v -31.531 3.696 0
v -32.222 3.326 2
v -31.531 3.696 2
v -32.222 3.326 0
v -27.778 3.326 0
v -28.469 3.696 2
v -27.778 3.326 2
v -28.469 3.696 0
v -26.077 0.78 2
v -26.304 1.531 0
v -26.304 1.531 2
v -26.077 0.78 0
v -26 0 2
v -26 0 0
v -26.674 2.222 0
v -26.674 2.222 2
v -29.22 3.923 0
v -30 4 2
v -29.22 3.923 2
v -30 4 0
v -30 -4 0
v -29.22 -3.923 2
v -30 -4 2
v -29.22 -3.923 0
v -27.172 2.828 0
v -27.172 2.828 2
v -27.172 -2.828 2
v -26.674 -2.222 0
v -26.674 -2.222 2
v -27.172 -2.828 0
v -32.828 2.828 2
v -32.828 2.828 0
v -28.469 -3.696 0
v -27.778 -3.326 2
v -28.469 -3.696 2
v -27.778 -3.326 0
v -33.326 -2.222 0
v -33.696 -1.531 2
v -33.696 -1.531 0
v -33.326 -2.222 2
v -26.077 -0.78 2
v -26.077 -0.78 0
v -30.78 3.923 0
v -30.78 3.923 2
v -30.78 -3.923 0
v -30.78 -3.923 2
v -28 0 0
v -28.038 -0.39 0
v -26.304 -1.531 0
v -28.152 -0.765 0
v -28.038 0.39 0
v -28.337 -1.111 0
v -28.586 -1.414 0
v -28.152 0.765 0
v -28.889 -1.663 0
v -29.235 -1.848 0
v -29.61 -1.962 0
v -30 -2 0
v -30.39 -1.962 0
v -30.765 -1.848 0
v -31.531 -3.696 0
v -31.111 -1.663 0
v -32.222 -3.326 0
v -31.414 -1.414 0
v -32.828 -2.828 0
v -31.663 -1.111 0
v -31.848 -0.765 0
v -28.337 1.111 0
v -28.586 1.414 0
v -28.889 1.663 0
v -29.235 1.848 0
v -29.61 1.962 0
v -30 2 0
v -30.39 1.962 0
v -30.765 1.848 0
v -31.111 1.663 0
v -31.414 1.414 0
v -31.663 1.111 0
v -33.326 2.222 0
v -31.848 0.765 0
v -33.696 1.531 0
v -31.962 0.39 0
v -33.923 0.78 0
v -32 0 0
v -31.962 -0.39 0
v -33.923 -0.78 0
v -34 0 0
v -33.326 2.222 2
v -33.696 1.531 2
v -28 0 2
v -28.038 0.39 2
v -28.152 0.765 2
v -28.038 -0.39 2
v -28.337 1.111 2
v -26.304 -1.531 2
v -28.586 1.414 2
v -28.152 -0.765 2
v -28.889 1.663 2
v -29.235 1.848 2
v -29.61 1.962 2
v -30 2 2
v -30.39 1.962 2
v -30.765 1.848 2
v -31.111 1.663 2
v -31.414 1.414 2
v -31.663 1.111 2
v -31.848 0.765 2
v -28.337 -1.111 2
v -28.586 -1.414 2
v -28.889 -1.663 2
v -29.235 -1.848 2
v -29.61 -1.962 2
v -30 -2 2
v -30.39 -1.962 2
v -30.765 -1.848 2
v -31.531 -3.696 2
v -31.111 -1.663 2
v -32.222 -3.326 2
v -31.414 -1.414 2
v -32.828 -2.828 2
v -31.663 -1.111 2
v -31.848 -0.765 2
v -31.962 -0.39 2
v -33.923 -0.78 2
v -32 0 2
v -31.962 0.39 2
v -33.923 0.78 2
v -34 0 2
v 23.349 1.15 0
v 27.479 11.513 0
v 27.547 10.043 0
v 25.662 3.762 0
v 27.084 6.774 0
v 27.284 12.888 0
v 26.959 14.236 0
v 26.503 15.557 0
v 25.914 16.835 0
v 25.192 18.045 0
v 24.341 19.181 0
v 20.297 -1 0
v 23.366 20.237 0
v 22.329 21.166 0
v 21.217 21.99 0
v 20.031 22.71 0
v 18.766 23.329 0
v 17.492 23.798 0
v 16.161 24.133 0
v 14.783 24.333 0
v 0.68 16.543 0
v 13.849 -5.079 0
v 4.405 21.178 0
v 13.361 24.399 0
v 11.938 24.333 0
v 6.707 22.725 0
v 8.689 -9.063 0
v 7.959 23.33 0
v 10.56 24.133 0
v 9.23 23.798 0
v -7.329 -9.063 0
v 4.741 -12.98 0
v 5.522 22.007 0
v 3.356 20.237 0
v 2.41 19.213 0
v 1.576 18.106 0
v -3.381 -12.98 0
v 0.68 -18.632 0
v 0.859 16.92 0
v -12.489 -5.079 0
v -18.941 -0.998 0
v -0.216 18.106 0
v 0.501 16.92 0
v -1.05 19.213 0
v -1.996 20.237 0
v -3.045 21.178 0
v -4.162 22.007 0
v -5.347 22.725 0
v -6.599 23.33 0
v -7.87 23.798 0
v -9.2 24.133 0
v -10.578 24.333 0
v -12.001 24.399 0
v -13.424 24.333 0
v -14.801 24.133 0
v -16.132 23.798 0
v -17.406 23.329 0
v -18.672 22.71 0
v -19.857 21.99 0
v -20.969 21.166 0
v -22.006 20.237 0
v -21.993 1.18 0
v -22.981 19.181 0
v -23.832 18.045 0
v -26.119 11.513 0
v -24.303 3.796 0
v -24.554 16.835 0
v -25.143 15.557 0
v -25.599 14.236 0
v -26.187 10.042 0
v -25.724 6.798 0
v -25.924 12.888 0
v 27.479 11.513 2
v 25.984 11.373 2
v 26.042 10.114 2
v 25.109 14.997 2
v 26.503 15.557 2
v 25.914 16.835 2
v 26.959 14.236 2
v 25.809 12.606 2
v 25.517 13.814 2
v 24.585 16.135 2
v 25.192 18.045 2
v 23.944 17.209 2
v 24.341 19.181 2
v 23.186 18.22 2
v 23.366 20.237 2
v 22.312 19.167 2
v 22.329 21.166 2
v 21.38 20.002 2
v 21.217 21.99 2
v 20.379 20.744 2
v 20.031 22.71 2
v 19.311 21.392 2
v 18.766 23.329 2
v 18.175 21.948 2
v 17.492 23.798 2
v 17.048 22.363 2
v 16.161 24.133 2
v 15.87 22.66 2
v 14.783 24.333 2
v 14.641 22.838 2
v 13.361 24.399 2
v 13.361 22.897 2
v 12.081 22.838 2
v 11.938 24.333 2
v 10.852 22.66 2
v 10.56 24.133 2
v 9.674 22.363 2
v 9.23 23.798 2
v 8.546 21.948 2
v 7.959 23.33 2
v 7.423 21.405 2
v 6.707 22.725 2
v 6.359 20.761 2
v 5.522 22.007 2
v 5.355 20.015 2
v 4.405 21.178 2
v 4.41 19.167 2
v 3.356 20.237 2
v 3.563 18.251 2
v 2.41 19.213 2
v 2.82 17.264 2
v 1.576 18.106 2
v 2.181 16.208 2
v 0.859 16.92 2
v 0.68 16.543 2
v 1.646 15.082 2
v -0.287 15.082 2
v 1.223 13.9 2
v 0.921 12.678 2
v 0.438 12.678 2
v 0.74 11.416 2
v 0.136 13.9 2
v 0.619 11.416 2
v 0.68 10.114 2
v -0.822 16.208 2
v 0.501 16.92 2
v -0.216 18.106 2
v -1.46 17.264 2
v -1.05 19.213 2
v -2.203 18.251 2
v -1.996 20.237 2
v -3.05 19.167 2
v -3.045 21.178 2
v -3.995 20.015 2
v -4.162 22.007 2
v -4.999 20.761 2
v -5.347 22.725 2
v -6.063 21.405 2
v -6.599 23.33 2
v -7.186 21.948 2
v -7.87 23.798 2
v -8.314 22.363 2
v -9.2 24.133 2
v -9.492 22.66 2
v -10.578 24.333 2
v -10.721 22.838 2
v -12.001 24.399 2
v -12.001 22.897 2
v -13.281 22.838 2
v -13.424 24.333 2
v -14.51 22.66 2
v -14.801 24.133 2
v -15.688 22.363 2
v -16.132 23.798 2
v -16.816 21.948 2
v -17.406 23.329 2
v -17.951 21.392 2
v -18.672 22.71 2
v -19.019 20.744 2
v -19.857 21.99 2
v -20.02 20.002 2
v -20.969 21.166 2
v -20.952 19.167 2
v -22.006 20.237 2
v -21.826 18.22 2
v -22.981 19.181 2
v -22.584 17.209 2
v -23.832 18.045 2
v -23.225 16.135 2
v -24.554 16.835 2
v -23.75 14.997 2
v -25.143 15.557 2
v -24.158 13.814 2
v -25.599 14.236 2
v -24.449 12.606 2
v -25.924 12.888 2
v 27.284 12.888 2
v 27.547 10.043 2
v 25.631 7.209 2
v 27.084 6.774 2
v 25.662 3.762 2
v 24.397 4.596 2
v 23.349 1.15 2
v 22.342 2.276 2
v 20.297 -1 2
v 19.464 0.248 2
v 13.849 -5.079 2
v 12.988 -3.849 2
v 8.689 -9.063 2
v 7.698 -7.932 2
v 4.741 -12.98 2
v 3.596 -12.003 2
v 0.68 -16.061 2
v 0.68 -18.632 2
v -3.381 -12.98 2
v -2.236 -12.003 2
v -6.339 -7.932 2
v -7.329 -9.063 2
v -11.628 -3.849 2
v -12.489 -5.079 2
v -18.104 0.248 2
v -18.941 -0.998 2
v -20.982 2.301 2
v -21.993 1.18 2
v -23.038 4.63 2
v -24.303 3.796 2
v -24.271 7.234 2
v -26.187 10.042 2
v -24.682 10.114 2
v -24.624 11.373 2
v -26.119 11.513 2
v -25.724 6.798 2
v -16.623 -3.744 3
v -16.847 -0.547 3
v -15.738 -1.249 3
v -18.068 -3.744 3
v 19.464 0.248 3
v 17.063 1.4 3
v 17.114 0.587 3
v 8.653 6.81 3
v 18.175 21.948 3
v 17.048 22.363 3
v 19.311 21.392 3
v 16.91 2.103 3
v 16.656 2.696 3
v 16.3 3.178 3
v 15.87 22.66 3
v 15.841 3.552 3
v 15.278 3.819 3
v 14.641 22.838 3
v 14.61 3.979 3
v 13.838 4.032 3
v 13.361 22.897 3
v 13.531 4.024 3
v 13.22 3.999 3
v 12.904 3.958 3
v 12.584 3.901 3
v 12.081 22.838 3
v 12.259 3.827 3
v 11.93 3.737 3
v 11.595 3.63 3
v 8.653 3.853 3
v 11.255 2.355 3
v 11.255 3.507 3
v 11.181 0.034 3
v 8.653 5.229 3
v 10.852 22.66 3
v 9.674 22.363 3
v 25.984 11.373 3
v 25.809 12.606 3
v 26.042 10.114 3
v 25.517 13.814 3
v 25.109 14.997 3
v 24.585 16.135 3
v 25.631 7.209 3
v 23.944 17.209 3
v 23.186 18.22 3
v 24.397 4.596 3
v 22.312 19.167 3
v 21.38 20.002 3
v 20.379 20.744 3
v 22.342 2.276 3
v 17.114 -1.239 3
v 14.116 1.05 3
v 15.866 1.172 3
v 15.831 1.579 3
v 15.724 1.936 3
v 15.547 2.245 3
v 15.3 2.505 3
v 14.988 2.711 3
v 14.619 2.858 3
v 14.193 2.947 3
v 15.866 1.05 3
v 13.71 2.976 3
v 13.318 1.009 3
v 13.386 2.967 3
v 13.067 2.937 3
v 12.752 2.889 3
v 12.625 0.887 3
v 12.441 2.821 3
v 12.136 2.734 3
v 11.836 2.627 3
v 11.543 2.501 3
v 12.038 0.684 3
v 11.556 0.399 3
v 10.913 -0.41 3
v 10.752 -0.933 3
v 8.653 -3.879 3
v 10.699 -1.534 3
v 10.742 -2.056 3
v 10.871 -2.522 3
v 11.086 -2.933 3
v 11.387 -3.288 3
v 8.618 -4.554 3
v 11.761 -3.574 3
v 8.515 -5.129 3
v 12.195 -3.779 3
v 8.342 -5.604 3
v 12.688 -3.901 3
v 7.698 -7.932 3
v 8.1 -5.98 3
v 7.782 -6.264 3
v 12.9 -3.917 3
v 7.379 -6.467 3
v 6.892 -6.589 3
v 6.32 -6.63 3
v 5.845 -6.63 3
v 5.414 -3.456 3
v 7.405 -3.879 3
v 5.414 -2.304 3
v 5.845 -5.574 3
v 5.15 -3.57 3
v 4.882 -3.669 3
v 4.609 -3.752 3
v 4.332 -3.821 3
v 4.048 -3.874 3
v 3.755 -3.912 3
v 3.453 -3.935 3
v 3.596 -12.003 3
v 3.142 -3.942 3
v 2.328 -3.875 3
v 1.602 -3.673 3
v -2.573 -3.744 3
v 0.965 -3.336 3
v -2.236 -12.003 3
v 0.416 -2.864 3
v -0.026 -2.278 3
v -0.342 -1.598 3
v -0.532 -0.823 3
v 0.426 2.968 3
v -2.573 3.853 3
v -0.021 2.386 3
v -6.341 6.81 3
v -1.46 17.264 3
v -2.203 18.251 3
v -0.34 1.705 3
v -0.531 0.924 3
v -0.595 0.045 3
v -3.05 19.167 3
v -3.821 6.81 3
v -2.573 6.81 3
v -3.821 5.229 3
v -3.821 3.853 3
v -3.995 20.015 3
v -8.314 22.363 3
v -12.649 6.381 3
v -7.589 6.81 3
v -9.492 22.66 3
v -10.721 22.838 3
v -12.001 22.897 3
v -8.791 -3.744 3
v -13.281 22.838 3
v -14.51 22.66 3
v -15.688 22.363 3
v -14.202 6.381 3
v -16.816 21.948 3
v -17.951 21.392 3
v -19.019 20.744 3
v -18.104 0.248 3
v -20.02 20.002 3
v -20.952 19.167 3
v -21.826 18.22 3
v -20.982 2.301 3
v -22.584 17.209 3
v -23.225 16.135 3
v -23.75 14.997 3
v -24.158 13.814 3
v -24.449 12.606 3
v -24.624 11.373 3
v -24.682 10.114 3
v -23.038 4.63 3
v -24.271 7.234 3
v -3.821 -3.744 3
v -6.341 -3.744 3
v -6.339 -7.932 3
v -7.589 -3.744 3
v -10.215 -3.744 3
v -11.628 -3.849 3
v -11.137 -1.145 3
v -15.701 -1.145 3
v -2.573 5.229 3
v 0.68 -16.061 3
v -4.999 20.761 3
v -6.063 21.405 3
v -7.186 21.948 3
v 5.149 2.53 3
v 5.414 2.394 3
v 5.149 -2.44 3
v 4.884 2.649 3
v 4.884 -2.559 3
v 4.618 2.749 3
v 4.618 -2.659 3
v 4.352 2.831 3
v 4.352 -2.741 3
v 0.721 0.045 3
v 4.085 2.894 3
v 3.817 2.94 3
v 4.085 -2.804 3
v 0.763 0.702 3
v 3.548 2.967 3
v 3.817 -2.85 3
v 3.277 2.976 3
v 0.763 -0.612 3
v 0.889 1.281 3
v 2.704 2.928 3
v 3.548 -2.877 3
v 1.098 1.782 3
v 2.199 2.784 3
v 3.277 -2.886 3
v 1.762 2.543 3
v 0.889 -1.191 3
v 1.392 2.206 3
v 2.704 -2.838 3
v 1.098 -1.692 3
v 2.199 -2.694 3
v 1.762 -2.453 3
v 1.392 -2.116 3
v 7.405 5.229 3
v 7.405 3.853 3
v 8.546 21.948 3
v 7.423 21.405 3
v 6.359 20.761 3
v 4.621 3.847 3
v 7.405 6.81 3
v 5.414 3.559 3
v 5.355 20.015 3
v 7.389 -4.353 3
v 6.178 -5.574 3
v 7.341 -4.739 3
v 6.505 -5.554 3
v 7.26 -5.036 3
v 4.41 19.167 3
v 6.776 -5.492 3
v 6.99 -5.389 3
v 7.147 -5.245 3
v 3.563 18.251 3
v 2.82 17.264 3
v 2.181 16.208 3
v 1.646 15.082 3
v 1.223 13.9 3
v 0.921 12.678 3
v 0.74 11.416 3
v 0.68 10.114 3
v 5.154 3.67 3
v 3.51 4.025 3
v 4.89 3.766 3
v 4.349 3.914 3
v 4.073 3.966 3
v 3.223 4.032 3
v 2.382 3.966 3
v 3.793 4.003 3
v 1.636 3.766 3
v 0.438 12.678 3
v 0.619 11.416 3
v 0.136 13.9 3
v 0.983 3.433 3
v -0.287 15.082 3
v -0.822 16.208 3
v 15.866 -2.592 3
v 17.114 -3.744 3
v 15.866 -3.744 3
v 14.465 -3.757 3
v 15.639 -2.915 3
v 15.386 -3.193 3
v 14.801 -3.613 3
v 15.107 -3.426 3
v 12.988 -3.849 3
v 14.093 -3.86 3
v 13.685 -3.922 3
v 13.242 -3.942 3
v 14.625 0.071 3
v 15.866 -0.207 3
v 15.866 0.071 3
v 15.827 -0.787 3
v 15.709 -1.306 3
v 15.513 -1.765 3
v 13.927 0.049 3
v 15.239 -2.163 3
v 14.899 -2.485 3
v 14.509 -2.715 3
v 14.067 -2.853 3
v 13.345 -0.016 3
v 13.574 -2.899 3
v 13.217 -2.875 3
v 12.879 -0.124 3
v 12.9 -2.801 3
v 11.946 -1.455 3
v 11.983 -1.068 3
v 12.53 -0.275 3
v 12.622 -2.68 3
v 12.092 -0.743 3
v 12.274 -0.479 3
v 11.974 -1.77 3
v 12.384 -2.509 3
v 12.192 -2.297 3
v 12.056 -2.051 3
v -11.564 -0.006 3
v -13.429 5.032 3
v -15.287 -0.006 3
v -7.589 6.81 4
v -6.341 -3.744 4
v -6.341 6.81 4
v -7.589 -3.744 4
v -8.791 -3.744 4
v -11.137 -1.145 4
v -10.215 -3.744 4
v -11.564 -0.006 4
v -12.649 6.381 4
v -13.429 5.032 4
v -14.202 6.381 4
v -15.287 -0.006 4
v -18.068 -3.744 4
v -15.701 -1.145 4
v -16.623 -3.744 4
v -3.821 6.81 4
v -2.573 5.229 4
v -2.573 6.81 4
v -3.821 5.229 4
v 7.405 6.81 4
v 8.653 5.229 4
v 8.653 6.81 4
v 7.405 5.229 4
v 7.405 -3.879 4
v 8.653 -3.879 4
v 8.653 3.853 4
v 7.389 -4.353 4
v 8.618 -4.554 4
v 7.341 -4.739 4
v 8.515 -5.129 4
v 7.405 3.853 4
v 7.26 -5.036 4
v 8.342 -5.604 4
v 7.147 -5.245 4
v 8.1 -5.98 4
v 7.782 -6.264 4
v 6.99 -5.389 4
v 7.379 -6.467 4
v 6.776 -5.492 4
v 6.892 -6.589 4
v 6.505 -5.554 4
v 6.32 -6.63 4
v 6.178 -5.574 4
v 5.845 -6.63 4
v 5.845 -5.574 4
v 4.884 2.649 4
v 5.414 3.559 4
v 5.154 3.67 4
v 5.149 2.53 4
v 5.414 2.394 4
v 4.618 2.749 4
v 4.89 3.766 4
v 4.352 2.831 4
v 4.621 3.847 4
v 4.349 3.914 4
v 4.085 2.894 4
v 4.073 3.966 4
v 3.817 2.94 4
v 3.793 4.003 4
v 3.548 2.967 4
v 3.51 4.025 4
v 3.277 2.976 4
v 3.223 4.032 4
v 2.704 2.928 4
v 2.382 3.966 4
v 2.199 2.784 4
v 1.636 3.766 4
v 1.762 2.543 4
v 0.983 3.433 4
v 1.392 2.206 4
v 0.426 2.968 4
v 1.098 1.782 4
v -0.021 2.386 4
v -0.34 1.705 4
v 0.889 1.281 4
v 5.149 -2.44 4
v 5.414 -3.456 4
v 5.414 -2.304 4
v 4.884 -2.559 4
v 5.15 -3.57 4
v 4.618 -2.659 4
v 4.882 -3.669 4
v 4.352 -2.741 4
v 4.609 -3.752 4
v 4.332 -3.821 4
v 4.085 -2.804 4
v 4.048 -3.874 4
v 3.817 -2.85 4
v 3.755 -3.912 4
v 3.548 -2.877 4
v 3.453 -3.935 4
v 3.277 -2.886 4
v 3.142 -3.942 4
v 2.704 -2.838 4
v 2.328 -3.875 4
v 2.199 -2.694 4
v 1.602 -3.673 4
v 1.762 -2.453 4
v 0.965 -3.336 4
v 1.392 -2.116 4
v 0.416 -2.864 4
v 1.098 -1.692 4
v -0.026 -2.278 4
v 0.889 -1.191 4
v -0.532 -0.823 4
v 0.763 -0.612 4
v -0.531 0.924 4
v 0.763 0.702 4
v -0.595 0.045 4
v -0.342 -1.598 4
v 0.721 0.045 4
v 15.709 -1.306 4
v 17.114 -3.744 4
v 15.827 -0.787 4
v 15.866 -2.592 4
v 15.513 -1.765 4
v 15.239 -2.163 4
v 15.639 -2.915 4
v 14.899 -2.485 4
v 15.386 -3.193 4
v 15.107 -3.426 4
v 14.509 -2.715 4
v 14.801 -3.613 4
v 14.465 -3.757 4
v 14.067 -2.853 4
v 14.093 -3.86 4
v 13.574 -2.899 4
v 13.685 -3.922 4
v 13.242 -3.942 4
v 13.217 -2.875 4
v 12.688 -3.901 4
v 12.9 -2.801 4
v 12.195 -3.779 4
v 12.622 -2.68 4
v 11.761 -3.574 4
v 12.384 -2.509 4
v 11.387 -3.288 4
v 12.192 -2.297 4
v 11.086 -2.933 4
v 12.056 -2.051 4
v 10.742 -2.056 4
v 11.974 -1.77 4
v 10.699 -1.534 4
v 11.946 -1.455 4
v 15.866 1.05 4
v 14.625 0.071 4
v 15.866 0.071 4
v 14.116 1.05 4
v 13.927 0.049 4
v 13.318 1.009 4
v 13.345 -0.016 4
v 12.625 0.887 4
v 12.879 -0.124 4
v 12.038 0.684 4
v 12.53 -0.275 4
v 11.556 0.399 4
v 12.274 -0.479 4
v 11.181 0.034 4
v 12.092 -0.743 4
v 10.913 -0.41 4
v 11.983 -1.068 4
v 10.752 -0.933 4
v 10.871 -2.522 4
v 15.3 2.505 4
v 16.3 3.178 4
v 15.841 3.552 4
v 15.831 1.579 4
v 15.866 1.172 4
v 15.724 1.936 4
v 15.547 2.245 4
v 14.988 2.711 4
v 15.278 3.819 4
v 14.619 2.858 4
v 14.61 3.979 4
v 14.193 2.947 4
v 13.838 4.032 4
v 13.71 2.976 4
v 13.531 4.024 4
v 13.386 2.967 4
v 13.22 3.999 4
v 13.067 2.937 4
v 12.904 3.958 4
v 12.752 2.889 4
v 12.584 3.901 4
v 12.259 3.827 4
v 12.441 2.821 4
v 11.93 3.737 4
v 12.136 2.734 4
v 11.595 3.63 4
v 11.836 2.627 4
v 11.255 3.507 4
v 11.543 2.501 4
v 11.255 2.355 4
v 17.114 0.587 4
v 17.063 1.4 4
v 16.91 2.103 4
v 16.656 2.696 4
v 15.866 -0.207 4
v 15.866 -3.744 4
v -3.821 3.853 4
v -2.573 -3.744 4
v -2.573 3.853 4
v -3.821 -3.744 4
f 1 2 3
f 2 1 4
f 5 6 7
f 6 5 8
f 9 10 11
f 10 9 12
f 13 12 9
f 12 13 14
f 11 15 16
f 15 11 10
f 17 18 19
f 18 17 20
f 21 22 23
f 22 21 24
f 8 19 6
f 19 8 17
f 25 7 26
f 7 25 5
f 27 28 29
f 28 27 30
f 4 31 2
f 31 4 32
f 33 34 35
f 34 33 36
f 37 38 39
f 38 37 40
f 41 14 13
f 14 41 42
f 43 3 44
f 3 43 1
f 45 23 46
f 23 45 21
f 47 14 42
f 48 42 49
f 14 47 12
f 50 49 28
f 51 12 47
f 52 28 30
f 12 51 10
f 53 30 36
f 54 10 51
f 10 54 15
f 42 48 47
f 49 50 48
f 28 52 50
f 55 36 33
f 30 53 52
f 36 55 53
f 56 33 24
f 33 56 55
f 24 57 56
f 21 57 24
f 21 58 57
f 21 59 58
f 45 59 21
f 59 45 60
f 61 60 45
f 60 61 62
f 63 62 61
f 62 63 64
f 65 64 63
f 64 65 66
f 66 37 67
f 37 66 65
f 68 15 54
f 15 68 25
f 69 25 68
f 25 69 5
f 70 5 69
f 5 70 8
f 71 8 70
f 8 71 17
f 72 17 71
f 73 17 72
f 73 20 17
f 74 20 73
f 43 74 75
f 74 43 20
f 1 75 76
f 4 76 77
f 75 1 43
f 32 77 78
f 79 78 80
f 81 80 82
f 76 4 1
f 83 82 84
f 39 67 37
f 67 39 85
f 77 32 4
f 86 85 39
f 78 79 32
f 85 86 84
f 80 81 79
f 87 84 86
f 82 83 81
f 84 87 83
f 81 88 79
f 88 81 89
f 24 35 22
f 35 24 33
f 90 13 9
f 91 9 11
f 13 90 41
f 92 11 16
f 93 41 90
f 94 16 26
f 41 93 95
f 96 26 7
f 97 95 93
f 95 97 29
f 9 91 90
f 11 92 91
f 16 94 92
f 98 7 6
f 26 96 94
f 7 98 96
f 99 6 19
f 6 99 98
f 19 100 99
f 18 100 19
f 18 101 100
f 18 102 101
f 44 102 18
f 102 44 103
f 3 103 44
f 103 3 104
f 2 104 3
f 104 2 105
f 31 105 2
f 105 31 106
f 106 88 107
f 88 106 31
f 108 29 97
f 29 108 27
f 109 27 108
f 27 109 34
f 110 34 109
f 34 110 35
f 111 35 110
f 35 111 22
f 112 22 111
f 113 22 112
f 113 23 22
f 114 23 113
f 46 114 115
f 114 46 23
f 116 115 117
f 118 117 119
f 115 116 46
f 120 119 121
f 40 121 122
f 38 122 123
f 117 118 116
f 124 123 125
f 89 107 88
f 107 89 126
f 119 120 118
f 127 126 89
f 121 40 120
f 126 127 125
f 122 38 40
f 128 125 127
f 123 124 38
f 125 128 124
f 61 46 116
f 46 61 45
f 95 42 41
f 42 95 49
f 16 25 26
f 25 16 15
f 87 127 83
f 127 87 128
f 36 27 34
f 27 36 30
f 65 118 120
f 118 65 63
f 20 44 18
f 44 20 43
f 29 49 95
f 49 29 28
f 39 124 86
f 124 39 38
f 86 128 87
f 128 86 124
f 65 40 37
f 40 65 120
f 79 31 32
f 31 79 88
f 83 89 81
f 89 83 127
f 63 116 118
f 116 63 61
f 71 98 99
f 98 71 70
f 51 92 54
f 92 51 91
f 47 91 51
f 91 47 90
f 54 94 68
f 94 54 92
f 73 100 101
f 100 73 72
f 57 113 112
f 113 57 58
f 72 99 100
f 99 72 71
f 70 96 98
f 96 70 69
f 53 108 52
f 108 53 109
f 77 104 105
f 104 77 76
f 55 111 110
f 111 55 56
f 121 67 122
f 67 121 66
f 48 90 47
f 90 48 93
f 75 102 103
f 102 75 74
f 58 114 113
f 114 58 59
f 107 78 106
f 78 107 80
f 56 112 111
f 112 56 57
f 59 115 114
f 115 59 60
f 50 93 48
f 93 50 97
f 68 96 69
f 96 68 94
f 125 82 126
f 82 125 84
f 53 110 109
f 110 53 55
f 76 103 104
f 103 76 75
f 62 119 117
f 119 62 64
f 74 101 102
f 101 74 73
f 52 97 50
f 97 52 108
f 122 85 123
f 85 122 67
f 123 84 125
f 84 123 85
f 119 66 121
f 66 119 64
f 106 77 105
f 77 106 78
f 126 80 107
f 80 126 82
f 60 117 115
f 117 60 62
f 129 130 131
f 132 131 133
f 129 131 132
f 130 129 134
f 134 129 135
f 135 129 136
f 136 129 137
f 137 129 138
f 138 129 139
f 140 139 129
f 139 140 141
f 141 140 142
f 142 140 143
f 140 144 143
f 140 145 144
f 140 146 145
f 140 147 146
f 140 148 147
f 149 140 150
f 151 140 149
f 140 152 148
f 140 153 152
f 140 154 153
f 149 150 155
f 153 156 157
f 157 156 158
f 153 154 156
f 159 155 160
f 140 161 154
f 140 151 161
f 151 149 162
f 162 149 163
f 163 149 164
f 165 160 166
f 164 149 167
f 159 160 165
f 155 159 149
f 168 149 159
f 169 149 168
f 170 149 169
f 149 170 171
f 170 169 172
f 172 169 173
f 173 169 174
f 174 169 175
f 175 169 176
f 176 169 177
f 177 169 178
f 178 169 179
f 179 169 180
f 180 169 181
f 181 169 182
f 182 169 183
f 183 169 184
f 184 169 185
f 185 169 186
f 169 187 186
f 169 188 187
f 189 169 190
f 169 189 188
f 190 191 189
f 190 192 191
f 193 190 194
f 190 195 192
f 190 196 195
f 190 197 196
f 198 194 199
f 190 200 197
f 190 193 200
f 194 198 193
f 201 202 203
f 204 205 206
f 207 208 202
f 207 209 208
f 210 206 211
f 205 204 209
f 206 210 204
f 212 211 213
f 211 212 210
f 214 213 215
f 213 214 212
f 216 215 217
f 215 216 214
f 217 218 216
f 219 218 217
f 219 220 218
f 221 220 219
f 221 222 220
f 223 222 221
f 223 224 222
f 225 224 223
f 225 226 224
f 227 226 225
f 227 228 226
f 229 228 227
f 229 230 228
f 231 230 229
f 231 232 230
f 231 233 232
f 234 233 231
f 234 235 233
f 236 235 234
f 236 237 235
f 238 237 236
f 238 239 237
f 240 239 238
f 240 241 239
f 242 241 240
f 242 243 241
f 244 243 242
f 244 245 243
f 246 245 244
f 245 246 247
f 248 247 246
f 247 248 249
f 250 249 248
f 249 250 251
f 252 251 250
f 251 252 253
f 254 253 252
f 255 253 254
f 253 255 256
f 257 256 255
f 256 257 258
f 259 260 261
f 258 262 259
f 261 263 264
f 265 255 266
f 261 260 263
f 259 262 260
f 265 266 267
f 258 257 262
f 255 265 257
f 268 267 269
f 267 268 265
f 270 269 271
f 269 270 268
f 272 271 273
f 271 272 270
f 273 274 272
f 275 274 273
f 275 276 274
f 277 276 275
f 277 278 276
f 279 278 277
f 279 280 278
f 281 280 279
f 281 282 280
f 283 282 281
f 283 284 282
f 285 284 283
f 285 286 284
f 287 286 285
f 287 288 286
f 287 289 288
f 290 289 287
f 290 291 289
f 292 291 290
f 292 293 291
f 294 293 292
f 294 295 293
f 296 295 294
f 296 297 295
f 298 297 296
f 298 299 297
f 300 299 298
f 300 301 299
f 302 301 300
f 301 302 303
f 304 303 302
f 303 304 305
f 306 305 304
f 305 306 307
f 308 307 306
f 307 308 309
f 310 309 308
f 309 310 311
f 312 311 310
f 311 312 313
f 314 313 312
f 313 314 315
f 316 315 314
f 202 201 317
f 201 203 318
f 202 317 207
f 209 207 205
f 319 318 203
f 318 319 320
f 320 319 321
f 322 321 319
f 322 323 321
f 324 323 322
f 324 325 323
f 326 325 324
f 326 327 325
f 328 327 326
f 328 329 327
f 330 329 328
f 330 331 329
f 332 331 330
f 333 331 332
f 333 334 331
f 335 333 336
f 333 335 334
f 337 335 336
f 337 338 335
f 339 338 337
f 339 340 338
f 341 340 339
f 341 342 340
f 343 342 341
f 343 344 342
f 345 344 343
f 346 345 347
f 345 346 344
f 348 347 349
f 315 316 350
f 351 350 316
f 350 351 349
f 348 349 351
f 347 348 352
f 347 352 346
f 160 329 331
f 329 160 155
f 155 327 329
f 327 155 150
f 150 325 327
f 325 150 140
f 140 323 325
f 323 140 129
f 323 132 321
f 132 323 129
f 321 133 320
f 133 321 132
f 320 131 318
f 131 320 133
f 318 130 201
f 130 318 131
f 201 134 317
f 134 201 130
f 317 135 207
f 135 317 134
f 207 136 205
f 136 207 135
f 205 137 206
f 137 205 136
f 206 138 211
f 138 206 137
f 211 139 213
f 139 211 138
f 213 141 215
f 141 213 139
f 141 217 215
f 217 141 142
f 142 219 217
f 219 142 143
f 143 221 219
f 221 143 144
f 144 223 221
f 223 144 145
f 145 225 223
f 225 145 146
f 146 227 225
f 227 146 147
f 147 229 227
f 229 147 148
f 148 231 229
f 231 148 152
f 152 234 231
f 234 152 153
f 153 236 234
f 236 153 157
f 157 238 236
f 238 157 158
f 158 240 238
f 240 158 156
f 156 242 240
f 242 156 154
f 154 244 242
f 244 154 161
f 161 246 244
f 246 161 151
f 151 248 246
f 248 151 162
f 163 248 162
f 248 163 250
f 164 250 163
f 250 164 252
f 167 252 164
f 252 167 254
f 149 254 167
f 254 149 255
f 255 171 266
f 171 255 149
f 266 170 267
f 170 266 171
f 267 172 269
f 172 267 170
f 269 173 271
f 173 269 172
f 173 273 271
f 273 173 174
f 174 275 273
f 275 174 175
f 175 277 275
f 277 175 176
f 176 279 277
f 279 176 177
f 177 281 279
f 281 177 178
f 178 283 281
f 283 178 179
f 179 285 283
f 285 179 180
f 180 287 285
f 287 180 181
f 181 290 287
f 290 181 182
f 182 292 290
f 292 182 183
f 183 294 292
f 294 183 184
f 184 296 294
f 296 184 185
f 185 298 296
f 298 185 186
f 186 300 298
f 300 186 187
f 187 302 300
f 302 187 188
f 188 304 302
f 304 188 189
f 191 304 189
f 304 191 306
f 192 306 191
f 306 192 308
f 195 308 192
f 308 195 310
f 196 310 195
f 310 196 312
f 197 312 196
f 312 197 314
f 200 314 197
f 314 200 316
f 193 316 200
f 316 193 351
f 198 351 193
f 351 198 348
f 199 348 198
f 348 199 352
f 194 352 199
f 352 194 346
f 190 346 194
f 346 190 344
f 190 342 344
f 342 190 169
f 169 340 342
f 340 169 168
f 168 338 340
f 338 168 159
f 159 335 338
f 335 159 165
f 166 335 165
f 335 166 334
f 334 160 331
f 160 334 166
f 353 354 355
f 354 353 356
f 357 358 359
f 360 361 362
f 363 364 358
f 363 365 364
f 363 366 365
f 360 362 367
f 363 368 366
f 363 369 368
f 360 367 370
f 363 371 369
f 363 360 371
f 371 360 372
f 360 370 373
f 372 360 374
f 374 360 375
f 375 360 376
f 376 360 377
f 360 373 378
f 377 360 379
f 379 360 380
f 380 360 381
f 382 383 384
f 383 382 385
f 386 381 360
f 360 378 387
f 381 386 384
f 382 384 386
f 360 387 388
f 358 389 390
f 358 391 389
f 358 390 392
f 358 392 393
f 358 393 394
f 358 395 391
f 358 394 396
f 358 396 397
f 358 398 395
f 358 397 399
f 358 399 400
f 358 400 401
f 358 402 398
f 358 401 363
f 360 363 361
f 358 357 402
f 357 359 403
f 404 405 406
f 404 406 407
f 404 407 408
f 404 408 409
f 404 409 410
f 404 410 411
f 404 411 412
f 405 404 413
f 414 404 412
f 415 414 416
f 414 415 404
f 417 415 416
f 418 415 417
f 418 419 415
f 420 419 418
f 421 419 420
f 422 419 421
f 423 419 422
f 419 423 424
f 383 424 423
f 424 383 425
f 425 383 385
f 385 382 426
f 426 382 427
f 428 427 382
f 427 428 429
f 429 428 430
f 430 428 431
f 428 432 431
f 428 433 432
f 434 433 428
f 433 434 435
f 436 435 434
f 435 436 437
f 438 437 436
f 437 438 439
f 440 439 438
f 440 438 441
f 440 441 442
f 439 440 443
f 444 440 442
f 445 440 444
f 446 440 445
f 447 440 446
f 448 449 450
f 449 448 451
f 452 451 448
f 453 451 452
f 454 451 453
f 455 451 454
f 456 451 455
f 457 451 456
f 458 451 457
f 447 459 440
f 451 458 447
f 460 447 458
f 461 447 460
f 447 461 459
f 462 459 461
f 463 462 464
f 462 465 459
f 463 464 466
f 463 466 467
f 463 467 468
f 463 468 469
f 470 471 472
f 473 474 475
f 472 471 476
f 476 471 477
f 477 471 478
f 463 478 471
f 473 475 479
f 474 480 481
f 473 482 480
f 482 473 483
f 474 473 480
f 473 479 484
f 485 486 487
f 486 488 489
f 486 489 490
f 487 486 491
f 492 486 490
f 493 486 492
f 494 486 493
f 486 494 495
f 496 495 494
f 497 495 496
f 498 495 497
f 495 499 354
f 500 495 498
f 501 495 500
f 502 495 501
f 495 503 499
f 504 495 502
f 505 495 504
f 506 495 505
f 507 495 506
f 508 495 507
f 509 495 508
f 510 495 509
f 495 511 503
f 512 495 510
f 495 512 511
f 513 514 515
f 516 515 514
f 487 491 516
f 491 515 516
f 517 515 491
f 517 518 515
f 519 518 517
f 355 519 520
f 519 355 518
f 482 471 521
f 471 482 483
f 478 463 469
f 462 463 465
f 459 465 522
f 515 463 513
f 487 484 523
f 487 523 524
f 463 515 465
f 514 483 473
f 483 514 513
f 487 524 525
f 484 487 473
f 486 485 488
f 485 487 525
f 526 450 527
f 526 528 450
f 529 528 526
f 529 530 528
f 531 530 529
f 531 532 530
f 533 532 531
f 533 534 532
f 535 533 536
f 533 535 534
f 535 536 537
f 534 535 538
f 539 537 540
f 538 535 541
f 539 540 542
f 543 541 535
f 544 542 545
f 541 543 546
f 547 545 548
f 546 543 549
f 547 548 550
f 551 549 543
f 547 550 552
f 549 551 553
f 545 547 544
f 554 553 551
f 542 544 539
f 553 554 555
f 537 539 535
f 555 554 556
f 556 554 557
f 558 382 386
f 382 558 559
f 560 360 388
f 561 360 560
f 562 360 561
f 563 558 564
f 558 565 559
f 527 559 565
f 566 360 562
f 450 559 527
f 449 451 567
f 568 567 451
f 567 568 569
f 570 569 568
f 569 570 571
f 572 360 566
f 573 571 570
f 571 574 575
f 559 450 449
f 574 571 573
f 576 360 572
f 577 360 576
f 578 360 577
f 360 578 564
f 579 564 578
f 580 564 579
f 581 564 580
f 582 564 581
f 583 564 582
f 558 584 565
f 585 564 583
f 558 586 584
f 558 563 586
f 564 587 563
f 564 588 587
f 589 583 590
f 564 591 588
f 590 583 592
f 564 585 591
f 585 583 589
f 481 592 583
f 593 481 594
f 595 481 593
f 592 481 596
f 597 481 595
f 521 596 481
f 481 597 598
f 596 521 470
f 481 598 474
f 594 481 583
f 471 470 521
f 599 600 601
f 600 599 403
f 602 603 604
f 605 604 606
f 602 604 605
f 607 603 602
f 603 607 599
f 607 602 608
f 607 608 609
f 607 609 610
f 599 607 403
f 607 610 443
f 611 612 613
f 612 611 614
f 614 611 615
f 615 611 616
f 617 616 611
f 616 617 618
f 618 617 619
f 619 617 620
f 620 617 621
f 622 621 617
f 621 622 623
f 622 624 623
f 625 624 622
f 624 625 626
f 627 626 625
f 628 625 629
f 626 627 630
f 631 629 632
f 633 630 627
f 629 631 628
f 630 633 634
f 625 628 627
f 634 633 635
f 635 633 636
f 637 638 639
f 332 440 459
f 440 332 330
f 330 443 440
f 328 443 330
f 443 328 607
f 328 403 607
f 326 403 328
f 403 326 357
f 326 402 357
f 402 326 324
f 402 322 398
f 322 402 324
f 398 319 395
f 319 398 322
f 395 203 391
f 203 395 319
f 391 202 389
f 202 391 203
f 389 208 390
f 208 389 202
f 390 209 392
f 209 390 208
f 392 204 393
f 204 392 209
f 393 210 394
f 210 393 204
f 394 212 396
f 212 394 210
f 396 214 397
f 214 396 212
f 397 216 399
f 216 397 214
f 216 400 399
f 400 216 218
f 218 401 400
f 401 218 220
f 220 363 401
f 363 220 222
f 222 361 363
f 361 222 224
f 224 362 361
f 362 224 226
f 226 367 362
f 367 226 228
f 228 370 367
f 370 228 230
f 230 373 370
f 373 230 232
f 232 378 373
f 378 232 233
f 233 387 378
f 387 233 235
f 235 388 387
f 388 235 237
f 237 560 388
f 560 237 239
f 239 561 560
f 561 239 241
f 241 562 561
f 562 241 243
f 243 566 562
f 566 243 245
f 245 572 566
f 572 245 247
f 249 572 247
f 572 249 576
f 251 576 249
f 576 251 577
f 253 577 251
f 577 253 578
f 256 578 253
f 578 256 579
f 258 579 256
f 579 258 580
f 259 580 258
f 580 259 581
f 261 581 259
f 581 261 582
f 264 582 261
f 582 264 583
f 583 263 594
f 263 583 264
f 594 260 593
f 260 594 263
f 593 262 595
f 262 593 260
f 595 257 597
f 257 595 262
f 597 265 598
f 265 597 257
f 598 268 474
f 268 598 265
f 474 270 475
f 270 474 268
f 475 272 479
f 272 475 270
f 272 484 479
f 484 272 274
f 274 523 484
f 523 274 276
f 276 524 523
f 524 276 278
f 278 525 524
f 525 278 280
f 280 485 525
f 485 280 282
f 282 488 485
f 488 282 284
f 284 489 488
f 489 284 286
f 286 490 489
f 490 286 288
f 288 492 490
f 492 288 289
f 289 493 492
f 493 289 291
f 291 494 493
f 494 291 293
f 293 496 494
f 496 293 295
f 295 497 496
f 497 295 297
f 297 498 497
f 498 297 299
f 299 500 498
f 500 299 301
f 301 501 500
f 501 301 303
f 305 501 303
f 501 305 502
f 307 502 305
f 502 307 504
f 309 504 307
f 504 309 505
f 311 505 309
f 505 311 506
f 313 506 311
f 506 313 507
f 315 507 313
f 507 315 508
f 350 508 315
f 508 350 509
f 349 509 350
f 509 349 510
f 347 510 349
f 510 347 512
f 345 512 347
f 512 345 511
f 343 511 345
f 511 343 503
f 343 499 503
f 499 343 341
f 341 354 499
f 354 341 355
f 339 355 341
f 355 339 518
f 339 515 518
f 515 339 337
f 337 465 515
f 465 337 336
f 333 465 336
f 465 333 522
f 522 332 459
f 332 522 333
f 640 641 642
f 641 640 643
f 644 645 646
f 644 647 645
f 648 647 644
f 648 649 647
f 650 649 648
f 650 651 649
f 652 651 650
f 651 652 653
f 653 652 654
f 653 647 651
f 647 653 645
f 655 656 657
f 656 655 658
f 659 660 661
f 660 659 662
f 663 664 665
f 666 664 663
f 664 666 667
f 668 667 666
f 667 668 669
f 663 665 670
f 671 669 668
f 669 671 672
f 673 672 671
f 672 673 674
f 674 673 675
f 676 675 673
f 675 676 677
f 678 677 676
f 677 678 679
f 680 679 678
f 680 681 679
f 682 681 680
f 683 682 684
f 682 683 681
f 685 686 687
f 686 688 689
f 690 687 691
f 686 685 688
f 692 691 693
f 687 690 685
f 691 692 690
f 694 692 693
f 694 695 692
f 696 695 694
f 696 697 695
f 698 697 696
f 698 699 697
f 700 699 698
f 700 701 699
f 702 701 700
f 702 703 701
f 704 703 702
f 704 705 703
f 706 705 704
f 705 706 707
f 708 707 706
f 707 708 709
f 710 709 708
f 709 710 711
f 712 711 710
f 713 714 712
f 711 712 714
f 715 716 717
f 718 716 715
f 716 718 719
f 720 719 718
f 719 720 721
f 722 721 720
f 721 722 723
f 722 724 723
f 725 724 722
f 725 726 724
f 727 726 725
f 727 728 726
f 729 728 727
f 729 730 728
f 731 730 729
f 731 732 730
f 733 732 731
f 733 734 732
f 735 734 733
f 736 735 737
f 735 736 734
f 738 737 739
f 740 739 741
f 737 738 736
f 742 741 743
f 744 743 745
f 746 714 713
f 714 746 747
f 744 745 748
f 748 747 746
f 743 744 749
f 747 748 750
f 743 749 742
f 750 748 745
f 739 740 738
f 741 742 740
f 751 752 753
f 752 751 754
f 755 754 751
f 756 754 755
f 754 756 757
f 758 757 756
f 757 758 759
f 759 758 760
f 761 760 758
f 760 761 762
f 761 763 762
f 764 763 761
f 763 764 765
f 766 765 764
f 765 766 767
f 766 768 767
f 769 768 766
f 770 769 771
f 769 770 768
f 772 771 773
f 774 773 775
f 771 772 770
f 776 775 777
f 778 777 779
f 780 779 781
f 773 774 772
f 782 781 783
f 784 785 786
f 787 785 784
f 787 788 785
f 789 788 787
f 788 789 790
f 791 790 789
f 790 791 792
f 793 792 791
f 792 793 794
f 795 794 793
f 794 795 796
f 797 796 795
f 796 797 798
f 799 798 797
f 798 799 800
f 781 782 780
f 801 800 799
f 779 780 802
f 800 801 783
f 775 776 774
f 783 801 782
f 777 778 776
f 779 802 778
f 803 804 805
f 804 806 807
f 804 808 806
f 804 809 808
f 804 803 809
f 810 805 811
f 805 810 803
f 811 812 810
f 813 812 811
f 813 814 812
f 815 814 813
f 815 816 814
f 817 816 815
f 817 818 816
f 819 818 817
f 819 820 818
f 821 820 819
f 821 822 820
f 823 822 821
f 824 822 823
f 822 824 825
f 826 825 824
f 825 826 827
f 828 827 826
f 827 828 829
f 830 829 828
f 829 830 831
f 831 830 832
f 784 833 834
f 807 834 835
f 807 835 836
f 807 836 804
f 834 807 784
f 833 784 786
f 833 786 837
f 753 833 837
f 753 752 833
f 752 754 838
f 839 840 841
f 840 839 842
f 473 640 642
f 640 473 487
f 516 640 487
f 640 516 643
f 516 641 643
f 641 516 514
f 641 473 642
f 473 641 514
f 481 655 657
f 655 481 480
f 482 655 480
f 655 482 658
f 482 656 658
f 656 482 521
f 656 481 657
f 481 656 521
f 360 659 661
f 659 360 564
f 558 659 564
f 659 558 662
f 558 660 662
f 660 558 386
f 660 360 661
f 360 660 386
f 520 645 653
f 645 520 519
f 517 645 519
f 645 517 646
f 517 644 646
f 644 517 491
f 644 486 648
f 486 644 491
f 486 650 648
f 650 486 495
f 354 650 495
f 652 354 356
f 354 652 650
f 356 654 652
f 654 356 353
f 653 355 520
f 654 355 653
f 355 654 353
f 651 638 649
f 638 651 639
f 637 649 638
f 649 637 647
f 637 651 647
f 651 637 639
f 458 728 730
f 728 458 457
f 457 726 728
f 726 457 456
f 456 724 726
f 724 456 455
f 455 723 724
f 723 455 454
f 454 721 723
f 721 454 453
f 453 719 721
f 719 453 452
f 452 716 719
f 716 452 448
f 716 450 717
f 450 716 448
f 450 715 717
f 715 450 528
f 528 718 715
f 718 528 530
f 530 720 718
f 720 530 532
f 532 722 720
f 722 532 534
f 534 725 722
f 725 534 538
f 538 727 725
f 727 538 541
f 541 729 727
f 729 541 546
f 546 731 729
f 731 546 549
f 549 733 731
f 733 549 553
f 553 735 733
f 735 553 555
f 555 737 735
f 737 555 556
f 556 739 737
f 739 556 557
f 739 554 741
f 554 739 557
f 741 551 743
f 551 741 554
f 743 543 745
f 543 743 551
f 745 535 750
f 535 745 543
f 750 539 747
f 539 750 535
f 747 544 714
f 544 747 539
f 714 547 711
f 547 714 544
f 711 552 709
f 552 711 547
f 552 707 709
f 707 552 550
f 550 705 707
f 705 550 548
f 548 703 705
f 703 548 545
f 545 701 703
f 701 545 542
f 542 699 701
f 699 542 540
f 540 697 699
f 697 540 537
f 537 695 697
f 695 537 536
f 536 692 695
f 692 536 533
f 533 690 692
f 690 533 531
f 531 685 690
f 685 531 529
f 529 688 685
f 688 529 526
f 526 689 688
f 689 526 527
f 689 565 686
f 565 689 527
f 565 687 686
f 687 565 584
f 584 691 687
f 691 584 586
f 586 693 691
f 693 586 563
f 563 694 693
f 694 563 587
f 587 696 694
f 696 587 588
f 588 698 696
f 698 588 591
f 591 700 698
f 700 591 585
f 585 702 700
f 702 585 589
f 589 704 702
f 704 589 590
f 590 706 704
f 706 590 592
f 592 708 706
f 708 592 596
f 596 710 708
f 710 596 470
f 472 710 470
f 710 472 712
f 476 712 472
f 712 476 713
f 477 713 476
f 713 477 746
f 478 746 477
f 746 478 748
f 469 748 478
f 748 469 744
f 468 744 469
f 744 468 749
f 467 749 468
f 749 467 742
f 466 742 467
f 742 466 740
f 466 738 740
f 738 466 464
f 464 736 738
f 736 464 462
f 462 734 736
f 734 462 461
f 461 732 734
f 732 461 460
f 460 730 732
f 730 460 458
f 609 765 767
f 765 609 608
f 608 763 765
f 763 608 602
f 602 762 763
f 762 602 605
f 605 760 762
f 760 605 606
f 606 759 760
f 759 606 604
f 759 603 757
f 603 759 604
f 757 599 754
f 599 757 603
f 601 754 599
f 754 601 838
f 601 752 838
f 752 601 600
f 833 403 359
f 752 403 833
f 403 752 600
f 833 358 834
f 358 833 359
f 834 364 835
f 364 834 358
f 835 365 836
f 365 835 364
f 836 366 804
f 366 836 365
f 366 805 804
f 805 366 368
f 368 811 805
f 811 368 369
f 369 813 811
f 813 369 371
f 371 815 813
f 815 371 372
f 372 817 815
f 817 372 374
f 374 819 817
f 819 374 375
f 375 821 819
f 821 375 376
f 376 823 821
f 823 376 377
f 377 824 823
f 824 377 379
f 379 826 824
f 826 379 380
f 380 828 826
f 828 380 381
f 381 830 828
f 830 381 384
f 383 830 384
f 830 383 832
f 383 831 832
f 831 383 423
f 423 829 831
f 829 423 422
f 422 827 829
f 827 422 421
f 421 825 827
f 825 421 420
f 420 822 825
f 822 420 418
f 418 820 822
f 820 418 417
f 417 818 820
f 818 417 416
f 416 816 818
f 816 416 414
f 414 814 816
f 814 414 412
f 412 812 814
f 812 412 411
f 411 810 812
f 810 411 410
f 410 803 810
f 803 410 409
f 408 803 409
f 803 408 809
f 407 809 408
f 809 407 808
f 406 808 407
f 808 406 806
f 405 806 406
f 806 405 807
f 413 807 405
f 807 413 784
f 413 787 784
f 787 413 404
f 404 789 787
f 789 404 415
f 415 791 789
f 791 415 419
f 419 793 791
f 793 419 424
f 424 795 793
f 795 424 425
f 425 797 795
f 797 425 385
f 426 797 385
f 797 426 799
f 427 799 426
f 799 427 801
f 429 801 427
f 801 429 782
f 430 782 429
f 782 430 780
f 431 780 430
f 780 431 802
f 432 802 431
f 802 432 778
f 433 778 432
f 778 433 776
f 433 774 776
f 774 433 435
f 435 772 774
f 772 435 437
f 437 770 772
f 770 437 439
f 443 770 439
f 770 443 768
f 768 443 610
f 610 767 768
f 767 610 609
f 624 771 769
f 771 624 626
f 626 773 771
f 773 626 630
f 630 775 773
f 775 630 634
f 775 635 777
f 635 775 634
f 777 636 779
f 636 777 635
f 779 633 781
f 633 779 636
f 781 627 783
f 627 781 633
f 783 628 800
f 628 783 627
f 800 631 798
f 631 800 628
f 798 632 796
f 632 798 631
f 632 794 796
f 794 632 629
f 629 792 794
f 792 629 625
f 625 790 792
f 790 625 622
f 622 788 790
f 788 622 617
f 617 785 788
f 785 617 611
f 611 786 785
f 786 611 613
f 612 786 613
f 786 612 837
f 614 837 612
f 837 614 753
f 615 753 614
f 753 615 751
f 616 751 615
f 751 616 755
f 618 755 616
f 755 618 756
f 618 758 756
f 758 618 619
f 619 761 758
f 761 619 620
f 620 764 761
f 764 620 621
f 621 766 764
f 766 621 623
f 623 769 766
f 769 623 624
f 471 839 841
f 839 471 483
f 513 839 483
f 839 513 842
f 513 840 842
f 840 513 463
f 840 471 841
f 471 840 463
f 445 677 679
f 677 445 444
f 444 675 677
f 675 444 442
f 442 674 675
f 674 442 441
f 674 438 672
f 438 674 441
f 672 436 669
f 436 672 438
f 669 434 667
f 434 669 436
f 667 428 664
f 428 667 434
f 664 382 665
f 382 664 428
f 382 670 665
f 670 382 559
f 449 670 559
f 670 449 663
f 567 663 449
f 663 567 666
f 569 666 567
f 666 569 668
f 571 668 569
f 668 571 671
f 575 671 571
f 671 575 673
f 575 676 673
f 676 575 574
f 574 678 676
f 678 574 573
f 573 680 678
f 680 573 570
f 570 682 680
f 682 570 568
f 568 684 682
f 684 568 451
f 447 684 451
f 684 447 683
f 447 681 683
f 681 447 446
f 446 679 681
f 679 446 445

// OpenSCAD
// Robi

/* [- BASIC PARAMETERS -] */
Text_Name = "❤";
Text_Name2 = "Alicja";
Text_Size = 50; // [4:1:50]
Text_Size2 = 10; // [4:1:50]
Letter_Spacing = 1; // [0.5:0.05:1.25] 

/* [- FONT SELECTION -] */
Use_Recomended_List = true;
aux1 = Use_Recomended_List;
Recomended_List = "DynaPuff";  // ["Zeyada","ZCOOL KuaiLe","Fascinate","Smythe","Press Start 2P","Honk","Amaranth","Balsamiq Sans","Chela One","Delicious Handrawn","DynaPuff","Chewy","Lobster"];
aux2 = Recomended_List;
List = "DynaPuff:style=Bold";  // font
aux3 = List;
Font_Choice = aux1 ? aux2 : aux3;        

/* [- ADVANCED PARAMETERS -] */ 
Text_Thickness = 1; // [0.5:0.5:10]
Base_Thickness = 2; // [0.5:0.5:10]
Base_Size = 1.5; // [0:0.5:5]
Ring_Horizontal = -30; // [-50:0.5:50]
Ring_Vertical = 0; // [-10:0.2:20]
Text_Color = "Gold"; // ["red","green","blue","yellow","cyan","magenta","orange","pink","purple","brown","white","black","grey","gold","lightblue"]
Base_Color = "Black"; // ["red","green","blue","yellow","cyan","magenta","orange","pink","purple","brown","white","black","grey","gold","lightblue"]
Text_X_Offset = 0; // [-50:1:50]
Text_Y_Offset = 0; // [-50:1:50]
Text2_X_Offset = 0; // [-50:1:50]
Text2_Y_Offset = 0; // [-50:1:50]

// - MODULES -

// Fonts
Fonts = [
["Zeyada","ZCOOL KuaiLe","Fascinate","Smythe","Press Start 2P","Honk","Aladin","Amaranth","Artifika","Balsamiq Sans","Chela One","Delicious Handrawn","DynaPuff","Chewy","Lobster"]
];

module text_name() {
    translate([Text_X_Offset, Text_Y_Offset, Base_Thickness])
        linear_extrude(height = Text_Thickness)
            text(Text_Name, size = Text_Size, font = Font_Choice, spacing = Letter_Spacing, halign="center", valign="center");
}

module text_name2() {
    translate([Text2_X_Offset, Text2_Y_Offset, Base_Thickness + Text_Thickness])
        linear_extrude(height = Text_Thickness)
            text(Text_Name2, size = Text_Size2, font = Font_Choice, spacing = Letter_Spacing, halign="center", valign="center");
}

module base() {
    linear_extrude(height = Base_Thickness)
        offset(delta = Base_Size)
            text(Text_Name, size = Text_Size, font = Font_Choice, spacing = Letter_Spacing, halign="center", valign="center");
}

module keychain_ring() {
    difference() {
        cylinder(h = 2, r = 4, center=true, $fn=32);
        cylinder(h = 2 + 0.1, r = 2, center=true, $fn=32);
    }
}

// - MAIN CALLS -

color(Base_Color)
    base();

color(Base_Color)
    translate([Ring_Horizontal, Ring_Vertical, Base_Thickness/2])
        keychain_ring();

color(Text_Color)
    text_name();

color(Base_Color)
    text_name2();
